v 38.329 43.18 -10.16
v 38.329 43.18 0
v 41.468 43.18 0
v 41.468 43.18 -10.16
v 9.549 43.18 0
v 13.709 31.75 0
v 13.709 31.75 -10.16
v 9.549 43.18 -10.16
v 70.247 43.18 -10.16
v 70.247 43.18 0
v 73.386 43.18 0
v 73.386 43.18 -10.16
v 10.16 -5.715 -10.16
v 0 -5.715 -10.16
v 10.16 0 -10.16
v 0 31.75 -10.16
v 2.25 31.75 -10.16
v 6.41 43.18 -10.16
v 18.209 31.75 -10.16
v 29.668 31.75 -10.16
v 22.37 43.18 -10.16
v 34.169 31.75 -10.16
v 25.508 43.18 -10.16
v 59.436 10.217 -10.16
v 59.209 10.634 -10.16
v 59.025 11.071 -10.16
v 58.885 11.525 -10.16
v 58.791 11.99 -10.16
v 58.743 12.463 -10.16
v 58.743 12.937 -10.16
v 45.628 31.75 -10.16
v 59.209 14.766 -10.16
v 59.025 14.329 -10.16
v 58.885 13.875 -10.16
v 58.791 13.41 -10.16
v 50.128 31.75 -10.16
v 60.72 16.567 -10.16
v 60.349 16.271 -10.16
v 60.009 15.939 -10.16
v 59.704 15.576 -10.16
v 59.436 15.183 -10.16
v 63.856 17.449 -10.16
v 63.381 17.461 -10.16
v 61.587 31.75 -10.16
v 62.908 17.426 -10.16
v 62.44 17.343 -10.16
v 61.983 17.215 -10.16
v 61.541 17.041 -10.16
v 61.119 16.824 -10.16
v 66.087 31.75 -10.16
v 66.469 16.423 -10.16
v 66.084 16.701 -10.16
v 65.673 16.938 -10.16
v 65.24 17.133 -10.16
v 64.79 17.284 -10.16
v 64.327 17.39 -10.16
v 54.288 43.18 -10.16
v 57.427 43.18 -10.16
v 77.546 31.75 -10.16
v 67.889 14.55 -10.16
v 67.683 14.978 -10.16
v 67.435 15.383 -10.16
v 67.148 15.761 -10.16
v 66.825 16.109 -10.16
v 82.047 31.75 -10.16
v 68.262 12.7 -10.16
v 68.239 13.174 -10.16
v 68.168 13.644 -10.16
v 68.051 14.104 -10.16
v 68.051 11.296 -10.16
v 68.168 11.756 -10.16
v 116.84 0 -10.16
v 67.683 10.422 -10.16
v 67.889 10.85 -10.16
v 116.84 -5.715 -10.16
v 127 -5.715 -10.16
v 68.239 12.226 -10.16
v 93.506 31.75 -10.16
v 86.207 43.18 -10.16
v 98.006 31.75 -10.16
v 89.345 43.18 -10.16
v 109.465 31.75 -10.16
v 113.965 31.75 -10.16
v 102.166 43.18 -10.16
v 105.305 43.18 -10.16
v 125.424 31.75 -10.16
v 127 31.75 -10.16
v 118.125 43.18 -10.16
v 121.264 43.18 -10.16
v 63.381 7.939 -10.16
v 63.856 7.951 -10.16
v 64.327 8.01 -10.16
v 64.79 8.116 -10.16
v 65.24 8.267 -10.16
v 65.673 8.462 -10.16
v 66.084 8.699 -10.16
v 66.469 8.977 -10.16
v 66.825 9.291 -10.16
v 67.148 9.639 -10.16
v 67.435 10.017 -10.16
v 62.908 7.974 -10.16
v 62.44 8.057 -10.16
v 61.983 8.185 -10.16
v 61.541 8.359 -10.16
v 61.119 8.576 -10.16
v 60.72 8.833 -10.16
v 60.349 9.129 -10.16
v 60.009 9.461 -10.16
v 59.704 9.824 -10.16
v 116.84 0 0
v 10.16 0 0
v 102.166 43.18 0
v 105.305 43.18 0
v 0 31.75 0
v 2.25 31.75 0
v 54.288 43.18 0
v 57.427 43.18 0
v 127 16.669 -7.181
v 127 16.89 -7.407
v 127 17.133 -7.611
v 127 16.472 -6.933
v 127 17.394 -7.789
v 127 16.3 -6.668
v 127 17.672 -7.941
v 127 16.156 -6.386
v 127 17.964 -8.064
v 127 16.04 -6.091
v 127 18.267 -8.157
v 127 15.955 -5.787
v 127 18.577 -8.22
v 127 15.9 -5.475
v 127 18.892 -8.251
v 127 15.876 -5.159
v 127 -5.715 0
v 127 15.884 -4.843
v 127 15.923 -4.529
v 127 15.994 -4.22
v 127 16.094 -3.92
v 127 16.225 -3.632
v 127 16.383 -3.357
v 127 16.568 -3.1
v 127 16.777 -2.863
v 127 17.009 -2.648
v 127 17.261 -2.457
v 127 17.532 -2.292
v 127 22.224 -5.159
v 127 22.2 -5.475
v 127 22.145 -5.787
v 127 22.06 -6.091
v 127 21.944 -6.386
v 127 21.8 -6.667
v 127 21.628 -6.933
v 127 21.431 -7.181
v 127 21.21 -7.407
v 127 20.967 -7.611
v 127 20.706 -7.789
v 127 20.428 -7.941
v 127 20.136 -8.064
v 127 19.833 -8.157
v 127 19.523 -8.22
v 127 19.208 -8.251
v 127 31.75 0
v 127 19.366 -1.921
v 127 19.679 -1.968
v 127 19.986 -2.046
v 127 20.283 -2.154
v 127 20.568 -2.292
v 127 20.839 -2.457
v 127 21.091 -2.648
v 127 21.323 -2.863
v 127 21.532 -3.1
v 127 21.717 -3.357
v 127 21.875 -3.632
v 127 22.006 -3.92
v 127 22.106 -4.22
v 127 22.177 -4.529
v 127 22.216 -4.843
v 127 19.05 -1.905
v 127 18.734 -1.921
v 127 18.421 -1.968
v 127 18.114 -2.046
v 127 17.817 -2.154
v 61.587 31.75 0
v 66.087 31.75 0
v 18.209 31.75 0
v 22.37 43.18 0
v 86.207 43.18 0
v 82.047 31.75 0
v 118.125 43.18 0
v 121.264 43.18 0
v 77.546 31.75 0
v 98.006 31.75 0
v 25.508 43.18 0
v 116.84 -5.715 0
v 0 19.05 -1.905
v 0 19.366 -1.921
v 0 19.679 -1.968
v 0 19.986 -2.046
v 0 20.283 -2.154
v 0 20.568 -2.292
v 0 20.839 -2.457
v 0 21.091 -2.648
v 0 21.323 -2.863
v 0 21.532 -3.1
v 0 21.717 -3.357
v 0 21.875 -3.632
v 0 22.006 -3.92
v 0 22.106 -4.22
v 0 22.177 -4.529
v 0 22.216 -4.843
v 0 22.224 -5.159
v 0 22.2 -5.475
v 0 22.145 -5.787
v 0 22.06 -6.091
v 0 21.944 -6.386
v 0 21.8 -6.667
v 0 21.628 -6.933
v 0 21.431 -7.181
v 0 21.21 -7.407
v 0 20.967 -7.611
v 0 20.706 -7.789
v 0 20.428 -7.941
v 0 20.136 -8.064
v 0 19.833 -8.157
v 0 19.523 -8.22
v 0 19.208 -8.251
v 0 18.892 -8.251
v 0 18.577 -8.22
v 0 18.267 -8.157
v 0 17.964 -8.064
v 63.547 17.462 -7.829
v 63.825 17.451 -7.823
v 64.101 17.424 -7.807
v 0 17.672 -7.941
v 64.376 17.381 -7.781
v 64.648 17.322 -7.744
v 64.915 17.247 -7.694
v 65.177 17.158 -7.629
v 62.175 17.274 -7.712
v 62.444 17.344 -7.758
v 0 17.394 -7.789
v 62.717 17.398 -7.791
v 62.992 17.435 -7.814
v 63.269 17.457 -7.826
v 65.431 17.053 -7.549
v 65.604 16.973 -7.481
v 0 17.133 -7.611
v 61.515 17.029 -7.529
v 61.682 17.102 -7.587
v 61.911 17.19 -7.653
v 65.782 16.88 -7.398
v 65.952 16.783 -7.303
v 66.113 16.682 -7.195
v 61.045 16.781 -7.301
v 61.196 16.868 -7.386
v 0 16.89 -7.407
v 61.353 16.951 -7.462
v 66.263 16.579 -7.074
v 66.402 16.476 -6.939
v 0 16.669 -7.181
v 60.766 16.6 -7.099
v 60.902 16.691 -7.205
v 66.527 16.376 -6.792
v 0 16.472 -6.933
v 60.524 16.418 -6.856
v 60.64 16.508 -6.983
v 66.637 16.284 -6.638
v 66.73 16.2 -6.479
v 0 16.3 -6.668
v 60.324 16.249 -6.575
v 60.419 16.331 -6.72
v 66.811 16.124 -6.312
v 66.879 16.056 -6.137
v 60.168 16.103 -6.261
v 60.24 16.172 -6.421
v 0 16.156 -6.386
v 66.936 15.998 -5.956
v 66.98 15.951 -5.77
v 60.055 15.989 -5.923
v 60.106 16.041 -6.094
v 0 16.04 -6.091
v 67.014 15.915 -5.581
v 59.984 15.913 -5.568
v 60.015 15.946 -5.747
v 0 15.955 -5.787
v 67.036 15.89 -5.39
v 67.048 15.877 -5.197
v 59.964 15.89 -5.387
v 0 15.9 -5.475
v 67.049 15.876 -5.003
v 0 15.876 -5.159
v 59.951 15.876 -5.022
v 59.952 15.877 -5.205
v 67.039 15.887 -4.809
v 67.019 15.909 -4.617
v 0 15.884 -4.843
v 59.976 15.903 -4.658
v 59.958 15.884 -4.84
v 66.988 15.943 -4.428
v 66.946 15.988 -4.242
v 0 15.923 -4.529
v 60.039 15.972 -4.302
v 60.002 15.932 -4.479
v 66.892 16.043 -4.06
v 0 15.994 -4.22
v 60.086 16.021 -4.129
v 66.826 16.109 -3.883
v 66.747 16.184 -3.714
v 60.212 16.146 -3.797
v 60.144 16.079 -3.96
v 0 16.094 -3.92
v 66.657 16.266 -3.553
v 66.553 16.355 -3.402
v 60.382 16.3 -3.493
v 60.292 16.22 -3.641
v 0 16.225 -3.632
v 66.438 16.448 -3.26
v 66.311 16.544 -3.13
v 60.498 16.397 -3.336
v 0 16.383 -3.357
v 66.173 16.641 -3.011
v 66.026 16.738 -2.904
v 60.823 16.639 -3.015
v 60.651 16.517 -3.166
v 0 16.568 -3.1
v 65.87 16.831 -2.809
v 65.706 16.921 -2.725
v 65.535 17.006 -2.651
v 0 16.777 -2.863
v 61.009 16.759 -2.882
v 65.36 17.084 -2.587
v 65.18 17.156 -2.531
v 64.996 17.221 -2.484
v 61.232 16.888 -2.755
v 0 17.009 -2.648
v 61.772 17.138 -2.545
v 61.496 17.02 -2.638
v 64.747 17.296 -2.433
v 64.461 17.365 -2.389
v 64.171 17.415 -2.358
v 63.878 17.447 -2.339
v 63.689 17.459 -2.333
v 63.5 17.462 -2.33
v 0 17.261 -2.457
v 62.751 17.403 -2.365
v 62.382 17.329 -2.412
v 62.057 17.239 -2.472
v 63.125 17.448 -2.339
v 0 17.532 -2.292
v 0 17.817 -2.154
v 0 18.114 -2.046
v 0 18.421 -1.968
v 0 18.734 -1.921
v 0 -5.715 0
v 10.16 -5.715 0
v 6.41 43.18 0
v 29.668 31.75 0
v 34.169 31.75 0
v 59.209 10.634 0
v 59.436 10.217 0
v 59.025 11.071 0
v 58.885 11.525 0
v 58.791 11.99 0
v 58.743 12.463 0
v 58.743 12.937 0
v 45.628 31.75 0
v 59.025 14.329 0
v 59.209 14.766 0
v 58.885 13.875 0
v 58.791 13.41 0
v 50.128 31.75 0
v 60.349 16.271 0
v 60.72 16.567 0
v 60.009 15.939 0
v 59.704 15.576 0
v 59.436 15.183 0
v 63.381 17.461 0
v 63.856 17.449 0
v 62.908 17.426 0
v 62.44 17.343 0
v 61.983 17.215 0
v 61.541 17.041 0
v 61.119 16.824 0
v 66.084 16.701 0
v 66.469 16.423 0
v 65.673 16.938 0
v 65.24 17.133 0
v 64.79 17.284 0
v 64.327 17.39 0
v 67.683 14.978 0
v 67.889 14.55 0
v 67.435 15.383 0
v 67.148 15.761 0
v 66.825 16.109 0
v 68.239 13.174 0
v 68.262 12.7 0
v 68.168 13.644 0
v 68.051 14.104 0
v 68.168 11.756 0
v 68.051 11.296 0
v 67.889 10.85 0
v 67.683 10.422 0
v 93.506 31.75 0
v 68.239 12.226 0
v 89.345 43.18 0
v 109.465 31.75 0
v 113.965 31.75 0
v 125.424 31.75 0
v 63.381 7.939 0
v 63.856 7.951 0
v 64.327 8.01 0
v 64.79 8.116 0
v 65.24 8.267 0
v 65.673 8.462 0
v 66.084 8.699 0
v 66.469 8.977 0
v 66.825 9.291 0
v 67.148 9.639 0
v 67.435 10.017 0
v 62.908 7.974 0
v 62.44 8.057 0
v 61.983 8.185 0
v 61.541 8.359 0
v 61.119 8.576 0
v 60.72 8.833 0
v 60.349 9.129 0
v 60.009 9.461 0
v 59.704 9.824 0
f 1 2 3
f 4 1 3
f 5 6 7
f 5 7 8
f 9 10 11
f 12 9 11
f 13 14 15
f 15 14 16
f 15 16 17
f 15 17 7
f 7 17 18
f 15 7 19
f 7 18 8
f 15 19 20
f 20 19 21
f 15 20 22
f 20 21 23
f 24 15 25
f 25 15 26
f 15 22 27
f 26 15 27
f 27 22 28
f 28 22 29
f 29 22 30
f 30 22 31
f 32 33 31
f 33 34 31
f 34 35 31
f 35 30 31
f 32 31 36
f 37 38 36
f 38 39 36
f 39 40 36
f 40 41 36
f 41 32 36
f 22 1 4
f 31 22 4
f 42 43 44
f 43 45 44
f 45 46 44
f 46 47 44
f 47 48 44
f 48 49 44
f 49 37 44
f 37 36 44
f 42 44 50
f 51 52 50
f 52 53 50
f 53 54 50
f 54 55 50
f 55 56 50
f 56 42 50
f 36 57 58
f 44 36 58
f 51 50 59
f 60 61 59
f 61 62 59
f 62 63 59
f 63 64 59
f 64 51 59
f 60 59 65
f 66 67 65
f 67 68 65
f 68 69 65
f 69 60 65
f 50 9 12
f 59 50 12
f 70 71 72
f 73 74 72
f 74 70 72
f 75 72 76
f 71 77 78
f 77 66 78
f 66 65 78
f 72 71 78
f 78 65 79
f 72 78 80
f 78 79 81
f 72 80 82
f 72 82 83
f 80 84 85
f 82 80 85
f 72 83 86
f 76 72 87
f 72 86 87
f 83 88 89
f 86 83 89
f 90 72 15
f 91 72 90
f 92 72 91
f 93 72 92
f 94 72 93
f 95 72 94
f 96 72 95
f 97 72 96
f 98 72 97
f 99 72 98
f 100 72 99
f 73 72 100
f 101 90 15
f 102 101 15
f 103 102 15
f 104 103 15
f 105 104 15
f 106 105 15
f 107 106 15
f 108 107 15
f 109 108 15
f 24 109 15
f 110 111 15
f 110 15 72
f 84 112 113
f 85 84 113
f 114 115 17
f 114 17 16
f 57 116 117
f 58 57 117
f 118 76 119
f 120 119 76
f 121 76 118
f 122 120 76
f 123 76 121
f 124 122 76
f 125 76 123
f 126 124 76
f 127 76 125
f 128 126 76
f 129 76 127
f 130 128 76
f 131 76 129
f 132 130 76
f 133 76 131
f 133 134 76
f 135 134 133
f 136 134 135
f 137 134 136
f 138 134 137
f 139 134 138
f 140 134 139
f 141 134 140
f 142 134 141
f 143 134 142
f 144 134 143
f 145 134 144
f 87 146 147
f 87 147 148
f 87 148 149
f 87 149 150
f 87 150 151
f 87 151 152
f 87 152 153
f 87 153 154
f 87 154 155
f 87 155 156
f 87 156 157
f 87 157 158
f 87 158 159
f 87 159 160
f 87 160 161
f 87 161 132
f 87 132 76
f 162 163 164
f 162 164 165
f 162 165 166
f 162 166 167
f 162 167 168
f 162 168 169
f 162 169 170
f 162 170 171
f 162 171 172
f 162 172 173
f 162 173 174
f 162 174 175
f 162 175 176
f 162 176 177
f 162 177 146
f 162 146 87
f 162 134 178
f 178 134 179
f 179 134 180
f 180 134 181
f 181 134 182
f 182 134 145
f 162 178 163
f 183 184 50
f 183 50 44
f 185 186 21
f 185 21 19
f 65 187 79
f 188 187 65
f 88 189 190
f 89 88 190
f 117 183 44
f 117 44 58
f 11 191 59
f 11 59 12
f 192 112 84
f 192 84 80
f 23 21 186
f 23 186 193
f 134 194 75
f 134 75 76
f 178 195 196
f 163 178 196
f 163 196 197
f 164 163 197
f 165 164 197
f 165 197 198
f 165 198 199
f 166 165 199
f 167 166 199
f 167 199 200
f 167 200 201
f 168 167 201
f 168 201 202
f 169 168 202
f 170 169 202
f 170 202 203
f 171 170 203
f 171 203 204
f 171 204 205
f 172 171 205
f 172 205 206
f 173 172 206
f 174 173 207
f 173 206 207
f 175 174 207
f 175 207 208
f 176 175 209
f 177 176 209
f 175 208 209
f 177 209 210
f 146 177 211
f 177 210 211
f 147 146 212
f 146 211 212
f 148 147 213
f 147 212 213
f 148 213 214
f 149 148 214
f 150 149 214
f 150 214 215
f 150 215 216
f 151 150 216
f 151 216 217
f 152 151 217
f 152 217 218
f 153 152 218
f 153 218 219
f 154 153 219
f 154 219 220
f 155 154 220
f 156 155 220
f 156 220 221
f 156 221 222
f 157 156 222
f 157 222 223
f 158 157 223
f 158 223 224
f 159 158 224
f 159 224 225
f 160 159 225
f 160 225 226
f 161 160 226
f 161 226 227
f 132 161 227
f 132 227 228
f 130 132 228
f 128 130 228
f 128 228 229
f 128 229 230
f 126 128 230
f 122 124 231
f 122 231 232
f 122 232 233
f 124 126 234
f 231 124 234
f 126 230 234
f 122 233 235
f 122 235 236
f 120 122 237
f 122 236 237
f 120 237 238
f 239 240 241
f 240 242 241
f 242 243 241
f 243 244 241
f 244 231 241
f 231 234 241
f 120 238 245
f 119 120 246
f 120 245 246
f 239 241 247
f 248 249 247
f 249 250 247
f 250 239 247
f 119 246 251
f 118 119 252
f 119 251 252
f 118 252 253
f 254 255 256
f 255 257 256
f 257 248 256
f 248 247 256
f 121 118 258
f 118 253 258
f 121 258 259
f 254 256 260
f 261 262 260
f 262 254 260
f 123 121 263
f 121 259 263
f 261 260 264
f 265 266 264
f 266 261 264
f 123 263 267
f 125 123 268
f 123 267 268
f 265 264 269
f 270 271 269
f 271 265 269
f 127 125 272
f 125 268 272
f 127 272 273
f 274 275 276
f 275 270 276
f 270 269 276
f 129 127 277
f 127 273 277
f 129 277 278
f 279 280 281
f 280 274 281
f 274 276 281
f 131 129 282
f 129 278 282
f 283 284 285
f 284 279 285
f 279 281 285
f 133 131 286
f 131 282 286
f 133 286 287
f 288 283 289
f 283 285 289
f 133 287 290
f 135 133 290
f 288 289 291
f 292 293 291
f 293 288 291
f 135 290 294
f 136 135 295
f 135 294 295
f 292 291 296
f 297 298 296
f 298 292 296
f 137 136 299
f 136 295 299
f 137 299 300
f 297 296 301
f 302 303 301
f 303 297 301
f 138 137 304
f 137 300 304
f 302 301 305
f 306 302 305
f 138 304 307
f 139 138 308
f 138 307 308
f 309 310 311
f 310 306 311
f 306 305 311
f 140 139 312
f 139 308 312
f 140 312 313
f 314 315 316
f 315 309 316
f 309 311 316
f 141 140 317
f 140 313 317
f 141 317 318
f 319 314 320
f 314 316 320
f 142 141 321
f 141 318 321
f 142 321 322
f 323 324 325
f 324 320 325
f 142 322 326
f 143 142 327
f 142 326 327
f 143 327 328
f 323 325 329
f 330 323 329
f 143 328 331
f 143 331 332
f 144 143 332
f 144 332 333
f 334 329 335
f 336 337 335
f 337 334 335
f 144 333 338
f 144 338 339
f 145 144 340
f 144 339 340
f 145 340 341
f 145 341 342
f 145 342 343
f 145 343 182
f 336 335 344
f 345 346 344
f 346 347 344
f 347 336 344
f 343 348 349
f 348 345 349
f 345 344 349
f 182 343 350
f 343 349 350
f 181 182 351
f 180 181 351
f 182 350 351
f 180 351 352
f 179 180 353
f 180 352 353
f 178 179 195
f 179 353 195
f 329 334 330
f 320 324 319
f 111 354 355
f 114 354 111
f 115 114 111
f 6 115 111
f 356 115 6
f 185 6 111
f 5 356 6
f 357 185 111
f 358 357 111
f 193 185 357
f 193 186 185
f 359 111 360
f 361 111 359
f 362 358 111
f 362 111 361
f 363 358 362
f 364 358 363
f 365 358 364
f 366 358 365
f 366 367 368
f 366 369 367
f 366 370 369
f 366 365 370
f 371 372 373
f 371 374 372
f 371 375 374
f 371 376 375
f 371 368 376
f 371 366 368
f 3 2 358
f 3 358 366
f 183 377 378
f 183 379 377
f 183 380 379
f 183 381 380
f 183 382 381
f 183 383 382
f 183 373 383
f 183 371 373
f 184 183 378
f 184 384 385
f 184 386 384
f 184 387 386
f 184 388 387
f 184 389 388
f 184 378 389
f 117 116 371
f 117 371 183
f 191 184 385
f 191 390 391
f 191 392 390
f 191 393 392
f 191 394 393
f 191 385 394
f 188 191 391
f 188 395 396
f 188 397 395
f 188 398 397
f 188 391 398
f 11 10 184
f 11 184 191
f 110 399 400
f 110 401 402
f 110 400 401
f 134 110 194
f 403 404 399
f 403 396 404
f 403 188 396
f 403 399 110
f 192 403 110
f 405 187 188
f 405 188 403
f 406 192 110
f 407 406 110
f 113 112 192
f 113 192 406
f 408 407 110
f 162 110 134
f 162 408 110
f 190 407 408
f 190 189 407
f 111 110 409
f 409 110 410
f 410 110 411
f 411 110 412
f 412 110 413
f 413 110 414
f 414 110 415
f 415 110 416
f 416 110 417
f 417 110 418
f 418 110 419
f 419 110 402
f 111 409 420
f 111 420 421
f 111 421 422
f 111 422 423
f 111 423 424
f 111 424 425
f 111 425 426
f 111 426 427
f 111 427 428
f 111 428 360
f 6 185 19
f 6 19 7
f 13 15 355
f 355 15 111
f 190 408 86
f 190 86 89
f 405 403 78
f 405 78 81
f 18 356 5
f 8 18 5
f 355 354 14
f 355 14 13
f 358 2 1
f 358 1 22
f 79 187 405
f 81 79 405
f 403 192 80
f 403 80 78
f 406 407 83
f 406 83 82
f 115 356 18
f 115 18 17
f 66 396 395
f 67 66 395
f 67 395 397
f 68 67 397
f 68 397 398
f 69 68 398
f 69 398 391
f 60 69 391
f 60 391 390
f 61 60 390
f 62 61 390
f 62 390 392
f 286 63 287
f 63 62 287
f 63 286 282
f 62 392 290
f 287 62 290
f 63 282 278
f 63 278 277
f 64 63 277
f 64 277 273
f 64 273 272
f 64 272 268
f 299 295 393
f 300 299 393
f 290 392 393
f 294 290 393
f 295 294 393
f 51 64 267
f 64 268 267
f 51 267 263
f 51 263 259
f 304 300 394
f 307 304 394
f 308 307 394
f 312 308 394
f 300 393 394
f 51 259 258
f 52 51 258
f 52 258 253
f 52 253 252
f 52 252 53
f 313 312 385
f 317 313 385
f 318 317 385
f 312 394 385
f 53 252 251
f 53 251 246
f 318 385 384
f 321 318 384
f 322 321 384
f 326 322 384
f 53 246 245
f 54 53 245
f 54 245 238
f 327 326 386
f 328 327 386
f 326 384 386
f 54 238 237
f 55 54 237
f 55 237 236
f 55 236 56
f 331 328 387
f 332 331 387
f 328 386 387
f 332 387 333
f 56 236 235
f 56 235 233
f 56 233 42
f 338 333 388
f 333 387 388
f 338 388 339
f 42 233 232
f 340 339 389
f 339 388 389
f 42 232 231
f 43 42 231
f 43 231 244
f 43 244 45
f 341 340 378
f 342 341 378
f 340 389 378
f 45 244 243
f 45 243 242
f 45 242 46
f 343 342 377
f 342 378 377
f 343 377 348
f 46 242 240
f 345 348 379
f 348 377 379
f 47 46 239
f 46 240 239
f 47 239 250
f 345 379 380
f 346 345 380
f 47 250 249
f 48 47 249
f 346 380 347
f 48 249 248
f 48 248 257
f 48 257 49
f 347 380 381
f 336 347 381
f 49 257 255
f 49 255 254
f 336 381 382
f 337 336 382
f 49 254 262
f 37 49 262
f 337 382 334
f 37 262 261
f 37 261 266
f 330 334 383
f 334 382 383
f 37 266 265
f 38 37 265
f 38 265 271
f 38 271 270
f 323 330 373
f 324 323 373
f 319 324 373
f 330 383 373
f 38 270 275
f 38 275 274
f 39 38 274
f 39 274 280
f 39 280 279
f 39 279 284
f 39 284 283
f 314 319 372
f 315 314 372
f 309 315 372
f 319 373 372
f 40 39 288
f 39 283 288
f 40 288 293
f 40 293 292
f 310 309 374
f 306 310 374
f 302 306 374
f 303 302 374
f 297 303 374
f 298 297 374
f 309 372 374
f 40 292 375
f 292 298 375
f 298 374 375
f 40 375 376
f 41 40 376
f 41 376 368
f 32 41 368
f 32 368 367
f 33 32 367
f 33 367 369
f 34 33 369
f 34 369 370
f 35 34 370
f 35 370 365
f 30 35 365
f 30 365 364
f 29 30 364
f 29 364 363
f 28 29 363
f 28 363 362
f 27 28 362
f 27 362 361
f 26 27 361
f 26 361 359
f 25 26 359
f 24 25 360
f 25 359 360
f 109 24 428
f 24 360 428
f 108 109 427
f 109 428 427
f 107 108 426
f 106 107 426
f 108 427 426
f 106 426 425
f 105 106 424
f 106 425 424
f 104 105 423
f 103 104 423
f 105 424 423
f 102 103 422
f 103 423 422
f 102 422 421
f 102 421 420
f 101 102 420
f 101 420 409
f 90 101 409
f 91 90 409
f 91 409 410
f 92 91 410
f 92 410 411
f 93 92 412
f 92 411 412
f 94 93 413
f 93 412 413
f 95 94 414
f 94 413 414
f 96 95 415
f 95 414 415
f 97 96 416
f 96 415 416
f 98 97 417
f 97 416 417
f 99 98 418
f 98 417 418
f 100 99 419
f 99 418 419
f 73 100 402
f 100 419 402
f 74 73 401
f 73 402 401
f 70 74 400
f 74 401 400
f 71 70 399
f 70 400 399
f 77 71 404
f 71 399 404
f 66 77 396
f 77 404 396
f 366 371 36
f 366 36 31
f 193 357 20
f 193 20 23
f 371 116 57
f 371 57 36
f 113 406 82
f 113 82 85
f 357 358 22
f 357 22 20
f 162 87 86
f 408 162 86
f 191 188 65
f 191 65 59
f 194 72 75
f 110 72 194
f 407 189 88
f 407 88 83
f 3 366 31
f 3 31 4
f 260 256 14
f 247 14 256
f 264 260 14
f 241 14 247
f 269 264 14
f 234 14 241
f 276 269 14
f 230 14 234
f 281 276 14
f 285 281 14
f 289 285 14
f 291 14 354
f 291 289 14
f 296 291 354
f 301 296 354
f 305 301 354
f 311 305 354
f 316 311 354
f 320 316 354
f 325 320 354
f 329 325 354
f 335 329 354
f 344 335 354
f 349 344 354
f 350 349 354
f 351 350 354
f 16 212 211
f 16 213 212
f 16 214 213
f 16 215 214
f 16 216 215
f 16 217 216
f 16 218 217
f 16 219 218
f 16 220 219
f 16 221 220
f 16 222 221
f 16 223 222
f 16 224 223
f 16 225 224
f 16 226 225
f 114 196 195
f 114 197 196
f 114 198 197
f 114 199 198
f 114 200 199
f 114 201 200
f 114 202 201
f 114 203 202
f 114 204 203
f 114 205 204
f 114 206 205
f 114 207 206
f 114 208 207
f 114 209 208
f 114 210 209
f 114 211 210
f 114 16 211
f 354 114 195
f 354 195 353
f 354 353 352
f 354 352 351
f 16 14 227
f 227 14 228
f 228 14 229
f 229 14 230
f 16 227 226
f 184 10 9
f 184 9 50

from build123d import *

# Parameters (mm, degrees)
BLANKSKE_W          = 127
BLANKSKE_H          = 43.18
BLANK_DEPTH         = 10.16
TOOTHCUTSIM_DEPTH   = 135.524116797
TEETHCUTS_COUNT     = 9
TEETHCUTS_PITCH     = 15.959290662
SKETCH4_R           = 3.175
CUT_EXTRUDE2_DEPTH  = 135.524116797
SKETCH1_W           = 10.16
SKETCH1_H           = 10.16
BOSS_EXTRUDE1_DEPTH = 5.715
SKETCH5_R           = 4.7625
CUT_EXTRUDE3_DEPTH  = 135.524116797


with BuildPart() as part:
    # BlankSke → Blank (new body)
    with BuildSketch(Plane.XY):
        with Locations((63.5, 21.59)):
            Rectangle(BLANKSKE_W, BLANKSKE_H)
    extrude(amount=-BLANK_DEPTH)

    # TooCutSkeSim → ToothCutSim (cut, through all)
    with BuildSketch(Plane.XY):
        Polygon((2.250111678, 31.75), (-2.250111678, 31.75), (-6.4195363, 43.2054), (6.4195363, 43.2054), align=None)
    toothcutsim = extrude(amount=-TOOTHCUTSIM_DEPTH, mode=Mode.SUBTRACT)

    # TeethCuts: ToothCutSim ×9
    with Locations(*[(i * TEETHCUTS_PITCH, 0, 0) for i in range(1, TEETHCUTS_COUNT)]):
        add(toothcutsim, mode=Mode.SUBTRACT)

    # Sketch4 → Cut-Extrude2 (cut, through all)
    with BuildSketch(Plane.ZY):
        with Locations((-5.08, 19.05)):
            Circle(SKETCH4_R)
    extrude(amount=-CUT_EXTRUDE2_DEPTH, mode=Mode.SUBTRACT)

    # Sketch1 → Boss-Extrude1 (add)
    with BuildSketch(Plane.XZ):
        with Locations((5.08, -5.08)):
            Rectangle(SKETCH1_W, SKETCH1_H)
        with Locations((121.92, -5.08)):
            Rectangle(SKETCH1_W, SKETCH1_H)
    extrude(amount=BOSS_EXTRUDE1_DEPTH)

    # Sketch5 → Cut-Extrude3 (cut, through all)
    with BuildSketch(Plane.XY):
        with Locations((63.5, 12.7)):
            Circle(SKETCH5_R)
    extrude(amount=-CUT_EXTRUDE3_DEPTH, mode=Mode.SUBTRACT)


solid = part.part
